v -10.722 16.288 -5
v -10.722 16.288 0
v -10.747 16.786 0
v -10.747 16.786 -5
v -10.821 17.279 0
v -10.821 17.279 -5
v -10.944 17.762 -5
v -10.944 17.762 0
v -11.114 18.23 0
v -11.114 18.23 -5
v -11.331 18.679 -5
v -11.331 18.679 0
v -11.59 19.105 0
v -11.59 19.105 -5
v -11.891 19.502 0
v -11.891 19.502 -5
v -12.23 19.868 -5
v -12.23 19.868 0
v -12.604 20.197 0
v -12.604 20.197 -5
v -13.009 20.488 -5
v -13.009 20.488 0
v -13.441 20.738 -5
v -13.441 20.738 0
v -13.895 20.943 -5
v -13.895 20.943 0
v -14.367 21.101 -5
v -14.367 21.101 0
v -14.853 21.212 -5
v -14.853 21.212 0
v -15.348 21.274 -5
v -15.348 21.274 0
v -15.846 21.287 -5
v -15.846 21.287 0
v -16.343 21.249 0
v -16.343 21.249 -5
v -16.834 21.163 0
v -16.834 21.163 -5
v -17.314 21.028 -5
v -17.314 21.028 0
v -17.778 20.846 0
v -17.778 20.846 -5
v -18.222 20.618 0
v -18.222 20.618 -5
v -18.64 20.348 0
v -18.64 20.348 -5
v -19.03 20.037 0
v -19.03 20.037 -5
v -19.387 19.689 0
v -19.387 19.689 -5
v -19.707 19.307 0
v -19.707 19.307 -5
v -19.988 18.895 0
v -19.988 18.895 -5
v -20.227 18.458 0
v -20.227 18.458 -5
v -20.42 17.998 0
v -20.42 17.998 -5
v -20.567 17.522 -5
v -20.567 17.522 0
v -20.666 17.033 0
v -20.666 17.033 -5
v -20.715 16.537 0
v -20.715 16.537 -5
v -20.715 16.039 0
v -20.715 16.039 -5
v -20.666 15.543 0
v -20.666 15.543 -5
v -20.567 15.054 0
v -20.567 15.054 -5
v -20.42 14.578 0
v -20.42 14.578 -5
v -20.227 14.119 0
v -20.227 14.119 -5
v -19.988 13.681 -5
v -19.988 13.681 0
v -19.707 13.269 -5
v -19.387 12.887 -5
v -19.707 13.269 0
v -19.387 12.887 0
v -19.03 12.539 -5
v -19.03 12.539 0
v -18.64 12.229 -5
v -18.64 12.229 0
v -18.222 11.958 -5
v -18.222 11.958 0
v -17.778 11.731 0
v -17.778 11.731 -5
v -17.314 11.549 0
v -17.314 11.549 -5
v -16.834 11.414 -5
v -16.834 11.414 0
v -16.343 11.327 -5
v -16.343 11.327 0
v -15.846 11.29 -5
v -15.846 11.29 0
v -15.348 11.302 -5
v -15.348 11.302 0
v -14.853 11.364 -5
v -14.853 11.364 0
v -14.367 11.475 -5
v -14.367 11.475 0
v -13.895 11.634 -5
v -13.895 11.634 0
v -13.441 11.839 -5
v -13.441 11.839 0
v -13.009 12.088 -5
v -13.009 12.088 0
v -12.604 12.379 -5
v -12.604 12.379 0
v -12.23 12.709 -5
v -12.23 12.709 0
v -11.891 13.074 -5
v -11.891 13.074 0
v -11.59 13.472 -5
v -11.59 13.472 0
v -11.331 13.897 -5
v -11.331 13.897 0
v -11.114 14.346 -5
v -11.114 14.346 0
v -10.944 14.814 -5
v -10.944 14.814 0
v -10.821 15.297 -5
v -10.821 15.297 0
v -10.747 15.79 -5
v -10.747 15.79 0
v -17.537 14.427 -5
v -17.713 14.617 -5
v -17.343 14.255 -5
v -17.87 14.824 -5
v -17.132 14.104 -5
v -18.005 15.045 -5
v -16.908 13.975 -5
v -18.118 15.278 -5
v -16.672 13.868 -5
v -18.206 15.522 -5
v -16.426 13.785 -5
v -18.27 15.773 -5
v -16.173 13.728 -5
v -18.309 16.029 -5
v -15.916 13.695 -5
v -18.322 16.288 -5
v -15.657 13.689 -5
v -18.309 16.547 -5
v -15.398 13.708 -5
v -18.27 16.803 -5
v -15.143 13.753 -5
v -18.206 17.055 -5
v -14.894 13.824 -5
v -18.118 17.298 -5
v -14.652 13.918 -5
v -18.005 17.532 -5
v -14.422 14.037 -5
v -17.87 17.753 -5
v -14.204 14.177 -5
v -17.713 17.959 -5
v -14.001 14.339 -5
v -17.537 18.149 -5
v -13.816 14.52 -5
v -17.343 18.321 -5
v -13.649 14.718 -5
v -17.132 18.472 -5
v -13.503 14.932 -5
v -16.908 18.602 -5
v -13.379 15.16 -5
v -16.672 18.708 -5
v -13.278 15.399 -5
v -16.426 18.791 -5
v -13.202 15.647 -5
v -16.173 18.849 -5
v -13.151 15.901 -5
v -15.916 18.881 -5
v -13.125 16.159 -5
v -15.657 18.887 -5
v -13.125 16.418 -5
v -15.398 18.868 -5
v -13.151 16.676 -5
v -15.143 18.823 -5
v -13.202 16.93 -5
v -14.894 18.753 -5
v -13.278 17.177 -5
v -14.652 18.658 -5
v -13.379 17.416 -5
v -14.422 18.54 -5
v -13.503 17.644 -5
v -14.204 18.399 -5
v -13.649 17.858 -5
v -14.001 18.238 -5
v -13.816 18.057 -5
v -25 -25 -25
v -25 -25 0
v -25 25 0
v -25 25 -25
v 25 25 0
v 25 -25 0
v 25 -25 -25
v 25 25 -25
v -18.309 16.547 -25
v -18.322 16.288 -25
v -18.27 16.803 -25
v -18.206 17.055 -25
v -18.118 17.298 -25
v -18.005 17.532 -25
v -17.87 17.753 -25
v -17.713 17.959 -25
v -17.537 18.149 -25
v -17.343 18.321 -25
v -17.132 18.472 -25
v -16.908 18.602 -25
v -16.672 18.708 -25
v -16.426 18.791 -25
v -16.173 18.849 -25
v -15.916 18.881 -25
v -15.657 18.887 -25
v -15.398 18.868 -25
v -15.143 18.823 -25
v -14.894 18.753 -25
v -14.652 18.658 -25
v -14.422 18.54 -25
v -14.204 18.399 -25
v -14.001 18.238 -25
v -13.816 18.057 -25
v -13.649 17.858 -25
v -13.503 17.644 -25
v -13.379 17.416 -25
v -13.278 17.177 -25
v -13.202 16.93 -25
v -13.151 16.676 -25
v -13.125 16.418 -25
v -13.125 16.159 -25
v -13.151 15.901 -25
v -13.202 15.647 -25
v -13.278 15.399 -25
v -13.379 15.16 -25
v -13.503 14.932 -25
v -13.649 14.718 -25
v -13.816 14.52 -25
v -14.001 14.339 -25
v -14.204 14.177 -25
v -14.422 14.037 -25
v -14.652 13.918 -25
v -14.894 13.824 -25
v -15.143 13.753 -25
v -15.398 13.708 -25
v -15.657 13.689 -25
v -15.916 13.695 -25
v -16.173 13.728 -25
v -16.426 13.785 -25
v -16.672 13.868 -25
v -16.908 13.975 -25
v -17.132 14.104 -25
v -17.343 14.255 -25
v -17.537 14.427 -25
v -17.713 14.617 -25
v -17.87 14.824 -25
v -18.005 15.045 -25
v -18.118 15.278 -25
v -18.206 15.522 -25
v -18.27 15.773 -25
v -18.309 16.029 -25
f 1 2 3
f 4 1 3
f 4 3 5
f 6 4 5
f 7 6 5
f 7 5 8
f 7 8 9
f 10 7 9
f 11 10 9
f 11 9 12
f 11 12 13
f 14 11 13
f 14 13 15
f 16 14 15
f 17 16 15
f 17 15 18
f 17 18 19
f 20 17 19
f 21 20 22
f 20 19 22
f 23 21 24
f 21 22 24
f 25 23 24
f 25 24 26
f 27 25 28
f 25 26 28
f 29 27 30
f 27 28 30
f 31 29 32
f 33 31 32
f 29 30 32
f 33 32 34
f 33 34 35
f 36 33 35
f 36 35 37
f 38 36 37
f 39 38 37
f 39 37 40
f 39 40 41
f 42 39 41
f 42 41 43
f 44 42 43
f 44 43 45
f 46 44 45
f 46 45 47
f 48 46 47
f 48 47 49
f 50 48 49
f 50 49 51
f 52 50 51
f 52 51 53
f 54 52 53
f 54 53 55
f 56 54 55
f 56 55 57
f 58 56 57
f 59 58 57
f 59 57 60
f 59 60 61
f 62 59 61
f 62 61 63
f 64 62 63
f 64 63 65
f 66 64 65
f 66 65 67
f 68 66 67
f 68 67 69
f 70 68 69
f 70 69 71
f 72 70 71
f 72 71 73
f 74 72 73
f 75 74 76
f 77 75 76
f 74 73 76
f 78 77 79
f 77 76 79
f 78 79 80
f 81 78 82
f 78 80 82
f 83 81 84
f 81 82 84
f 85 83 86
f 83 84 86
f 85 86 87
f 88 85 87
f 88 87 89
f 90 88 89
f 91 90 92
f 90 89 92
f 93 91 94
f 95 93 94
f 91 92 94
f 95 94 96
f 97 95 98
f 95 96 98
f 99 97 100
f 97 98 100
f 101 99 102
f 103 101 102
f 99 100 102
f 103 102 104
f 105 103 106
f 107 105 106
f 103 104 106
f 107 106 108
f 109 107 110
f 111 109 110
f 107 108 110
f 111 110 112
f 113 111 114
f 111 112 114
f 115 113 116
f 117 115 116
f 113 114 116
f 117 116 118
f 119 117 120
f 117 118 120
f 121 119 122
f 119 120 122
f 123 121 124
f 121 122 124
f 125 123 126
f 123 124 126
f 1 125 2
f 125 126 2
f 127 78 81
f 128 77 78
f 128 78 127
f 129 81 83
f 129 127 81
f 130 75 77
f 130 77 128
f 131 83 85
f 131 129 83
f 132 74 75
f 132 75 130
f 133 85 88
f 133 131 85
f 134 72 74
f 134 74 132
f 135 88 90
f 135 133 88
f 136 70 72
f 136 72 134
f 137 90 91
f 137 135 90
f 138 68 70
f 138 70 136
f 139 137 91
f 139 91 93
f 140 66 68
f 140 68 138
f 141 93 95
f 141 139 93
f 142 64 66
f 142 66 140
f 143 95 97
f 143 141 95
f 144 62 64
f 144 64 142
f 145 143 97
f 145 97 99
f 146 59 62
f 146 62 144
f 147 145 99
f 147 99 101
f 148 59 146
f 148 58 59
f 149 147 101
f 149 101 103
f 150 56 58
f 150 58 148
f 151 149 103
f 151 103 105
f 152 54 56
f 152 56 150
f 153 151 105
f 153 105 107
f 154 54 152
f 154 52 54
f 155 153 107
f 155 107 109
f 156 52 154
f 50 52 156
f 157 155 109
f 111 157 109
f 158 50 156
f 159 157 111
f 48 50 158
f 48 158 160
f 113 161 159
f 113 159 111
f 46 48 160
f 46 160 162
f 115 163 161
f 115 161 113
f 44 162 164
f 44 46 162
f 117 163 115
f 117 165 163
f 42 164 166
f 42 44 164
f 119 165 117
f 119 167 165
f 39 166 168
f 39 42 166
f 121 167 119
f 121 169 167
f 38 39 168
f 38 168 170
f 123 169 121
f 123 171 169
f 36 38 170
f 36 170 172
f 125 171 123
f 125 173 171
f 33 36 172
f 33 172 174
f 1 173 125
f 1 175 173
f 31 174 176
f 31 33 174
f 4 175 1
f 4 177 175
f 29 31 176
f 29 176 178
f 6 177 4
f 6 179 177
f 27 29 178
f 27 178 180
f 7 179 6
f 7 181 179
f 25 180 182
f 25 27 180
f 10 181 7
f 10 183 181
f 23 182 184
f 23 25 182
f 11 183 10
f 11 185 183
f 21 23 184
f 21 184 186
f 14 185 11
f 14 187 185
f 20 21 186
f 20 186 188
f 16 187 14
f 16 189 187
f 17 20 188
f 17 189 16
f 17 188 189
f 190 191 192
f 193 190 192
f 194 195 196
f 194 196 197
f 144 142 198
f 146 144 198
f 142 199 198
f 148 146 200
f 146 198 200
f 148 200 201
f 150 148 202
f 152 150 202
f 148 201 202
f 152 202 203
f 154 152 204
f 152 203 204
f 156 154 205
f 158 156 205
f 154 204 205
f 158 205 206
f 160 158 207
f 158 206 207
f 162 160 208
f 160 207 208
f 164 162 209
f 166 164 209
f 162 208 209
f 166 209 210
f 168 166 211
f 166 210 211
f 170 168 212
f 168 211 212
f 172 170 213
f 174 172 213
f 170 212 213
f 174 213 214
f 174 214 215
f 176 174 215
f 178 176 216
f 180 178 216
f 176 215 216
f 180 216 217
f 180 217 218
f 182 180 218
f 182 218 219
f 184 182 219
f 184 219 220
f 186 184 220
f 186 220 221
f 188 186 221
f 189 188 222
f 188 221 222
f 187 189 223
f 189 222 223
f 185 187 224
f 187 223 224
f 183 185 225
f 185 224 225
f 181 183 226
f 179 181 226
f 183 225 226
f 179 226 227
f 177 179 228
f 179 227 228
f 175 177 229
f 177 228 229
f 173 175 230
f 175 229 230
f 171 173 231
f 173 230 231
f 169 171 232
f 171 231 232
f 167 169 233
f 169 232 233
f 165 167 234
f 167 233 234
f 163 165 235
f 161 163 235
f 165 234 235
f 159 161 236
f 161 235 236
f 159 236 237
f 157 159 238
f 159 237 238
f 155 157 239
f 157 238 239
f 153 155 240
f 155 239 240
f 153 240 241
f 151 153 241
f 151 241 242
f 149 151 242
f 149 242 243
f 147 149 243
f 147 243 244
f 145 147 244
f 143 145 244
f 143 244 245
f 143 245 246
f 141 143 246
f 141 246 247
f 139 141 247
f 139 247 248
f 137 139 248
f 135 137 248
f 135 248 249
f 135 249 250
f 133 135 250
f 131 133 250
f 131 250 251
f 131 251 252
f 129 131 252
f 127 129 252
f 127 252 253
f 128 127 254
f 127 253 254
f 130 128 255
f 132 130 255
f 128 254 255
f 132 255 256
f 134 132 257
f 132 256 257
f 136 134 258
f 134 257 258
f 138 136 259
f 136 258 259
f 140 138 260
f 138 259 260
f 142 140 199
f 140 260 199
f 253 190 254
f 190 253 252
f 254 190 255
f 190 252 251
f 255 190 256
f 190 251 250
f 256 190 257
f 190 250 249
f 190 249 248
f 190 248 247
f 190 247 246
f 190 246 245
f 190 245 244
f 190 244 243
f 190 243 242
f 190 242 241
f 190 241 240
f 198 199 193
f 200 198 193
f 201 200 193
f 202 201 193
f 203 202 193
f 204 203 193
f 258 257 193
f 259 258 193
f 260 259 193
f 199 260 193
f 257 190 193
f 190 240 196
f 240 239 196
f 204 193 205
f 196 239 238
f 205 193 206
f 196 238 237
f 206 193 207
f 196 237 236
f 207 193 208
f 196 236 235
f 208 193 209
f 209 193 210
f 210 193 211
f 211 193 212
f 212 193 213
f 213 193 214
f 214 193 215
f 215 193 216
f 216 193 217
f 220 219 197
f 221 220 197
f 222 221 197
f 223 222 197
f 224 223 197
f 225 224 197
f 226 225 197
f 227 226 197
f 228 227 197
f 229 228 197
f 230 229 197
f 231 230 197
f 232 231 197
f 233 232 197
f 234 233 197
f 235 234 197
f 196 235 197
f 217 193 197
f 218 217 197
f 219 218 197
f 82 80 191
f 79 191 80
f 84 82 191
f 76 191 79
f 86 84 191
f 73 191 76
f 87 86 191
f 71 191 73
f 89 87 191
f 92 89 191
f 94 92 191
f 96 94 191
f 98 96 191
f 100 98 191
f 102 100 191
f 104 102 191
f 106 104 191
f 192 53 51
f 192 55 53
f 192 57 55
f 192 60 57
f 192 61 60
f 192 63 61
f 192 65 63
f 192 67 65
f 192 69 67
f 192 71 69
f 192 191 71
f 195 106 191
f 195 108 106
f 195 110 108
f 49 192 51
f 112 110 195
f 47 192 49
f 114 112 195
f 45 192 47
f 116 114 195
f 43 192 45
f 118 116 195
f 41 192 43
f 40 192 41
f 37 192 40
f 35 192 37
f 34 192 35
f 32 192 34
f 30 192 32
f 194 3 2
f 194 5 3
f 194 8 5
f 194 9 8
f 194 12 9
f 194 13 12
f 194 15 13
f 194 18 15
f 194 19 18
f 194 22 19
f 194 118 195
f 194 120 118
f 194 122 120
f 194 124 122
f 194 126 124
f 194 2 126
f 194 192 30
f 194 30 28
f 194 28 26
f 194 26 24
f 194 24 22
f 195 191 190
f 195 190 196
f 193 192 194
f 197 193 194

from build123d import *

# Parameters (mm, degrees)
F0_W           = 50
F0_H           = 50
F1_DEPTH       = 25
F3_D           = 5.2
F3_CBORE_D     = 10
F3_CBORE_DEPTH = 5


with BuildPart() as f1:
    # F0 (on Top) → F1 (new body)
    with BuildSketch(Plane.XY):
        Rectangle(F0_W, F0_H)
    extrude(amount=-F1_DEPTH)

    # F3 (through all)
    with Locations(Plane.XY):
        with Locations((-15.721669, 16.288219)):
            CounterBoreHole(F3_D / 2, F3_CBORE_D / 2, F3_CBORE_DEPTH)


solid = f1.part
